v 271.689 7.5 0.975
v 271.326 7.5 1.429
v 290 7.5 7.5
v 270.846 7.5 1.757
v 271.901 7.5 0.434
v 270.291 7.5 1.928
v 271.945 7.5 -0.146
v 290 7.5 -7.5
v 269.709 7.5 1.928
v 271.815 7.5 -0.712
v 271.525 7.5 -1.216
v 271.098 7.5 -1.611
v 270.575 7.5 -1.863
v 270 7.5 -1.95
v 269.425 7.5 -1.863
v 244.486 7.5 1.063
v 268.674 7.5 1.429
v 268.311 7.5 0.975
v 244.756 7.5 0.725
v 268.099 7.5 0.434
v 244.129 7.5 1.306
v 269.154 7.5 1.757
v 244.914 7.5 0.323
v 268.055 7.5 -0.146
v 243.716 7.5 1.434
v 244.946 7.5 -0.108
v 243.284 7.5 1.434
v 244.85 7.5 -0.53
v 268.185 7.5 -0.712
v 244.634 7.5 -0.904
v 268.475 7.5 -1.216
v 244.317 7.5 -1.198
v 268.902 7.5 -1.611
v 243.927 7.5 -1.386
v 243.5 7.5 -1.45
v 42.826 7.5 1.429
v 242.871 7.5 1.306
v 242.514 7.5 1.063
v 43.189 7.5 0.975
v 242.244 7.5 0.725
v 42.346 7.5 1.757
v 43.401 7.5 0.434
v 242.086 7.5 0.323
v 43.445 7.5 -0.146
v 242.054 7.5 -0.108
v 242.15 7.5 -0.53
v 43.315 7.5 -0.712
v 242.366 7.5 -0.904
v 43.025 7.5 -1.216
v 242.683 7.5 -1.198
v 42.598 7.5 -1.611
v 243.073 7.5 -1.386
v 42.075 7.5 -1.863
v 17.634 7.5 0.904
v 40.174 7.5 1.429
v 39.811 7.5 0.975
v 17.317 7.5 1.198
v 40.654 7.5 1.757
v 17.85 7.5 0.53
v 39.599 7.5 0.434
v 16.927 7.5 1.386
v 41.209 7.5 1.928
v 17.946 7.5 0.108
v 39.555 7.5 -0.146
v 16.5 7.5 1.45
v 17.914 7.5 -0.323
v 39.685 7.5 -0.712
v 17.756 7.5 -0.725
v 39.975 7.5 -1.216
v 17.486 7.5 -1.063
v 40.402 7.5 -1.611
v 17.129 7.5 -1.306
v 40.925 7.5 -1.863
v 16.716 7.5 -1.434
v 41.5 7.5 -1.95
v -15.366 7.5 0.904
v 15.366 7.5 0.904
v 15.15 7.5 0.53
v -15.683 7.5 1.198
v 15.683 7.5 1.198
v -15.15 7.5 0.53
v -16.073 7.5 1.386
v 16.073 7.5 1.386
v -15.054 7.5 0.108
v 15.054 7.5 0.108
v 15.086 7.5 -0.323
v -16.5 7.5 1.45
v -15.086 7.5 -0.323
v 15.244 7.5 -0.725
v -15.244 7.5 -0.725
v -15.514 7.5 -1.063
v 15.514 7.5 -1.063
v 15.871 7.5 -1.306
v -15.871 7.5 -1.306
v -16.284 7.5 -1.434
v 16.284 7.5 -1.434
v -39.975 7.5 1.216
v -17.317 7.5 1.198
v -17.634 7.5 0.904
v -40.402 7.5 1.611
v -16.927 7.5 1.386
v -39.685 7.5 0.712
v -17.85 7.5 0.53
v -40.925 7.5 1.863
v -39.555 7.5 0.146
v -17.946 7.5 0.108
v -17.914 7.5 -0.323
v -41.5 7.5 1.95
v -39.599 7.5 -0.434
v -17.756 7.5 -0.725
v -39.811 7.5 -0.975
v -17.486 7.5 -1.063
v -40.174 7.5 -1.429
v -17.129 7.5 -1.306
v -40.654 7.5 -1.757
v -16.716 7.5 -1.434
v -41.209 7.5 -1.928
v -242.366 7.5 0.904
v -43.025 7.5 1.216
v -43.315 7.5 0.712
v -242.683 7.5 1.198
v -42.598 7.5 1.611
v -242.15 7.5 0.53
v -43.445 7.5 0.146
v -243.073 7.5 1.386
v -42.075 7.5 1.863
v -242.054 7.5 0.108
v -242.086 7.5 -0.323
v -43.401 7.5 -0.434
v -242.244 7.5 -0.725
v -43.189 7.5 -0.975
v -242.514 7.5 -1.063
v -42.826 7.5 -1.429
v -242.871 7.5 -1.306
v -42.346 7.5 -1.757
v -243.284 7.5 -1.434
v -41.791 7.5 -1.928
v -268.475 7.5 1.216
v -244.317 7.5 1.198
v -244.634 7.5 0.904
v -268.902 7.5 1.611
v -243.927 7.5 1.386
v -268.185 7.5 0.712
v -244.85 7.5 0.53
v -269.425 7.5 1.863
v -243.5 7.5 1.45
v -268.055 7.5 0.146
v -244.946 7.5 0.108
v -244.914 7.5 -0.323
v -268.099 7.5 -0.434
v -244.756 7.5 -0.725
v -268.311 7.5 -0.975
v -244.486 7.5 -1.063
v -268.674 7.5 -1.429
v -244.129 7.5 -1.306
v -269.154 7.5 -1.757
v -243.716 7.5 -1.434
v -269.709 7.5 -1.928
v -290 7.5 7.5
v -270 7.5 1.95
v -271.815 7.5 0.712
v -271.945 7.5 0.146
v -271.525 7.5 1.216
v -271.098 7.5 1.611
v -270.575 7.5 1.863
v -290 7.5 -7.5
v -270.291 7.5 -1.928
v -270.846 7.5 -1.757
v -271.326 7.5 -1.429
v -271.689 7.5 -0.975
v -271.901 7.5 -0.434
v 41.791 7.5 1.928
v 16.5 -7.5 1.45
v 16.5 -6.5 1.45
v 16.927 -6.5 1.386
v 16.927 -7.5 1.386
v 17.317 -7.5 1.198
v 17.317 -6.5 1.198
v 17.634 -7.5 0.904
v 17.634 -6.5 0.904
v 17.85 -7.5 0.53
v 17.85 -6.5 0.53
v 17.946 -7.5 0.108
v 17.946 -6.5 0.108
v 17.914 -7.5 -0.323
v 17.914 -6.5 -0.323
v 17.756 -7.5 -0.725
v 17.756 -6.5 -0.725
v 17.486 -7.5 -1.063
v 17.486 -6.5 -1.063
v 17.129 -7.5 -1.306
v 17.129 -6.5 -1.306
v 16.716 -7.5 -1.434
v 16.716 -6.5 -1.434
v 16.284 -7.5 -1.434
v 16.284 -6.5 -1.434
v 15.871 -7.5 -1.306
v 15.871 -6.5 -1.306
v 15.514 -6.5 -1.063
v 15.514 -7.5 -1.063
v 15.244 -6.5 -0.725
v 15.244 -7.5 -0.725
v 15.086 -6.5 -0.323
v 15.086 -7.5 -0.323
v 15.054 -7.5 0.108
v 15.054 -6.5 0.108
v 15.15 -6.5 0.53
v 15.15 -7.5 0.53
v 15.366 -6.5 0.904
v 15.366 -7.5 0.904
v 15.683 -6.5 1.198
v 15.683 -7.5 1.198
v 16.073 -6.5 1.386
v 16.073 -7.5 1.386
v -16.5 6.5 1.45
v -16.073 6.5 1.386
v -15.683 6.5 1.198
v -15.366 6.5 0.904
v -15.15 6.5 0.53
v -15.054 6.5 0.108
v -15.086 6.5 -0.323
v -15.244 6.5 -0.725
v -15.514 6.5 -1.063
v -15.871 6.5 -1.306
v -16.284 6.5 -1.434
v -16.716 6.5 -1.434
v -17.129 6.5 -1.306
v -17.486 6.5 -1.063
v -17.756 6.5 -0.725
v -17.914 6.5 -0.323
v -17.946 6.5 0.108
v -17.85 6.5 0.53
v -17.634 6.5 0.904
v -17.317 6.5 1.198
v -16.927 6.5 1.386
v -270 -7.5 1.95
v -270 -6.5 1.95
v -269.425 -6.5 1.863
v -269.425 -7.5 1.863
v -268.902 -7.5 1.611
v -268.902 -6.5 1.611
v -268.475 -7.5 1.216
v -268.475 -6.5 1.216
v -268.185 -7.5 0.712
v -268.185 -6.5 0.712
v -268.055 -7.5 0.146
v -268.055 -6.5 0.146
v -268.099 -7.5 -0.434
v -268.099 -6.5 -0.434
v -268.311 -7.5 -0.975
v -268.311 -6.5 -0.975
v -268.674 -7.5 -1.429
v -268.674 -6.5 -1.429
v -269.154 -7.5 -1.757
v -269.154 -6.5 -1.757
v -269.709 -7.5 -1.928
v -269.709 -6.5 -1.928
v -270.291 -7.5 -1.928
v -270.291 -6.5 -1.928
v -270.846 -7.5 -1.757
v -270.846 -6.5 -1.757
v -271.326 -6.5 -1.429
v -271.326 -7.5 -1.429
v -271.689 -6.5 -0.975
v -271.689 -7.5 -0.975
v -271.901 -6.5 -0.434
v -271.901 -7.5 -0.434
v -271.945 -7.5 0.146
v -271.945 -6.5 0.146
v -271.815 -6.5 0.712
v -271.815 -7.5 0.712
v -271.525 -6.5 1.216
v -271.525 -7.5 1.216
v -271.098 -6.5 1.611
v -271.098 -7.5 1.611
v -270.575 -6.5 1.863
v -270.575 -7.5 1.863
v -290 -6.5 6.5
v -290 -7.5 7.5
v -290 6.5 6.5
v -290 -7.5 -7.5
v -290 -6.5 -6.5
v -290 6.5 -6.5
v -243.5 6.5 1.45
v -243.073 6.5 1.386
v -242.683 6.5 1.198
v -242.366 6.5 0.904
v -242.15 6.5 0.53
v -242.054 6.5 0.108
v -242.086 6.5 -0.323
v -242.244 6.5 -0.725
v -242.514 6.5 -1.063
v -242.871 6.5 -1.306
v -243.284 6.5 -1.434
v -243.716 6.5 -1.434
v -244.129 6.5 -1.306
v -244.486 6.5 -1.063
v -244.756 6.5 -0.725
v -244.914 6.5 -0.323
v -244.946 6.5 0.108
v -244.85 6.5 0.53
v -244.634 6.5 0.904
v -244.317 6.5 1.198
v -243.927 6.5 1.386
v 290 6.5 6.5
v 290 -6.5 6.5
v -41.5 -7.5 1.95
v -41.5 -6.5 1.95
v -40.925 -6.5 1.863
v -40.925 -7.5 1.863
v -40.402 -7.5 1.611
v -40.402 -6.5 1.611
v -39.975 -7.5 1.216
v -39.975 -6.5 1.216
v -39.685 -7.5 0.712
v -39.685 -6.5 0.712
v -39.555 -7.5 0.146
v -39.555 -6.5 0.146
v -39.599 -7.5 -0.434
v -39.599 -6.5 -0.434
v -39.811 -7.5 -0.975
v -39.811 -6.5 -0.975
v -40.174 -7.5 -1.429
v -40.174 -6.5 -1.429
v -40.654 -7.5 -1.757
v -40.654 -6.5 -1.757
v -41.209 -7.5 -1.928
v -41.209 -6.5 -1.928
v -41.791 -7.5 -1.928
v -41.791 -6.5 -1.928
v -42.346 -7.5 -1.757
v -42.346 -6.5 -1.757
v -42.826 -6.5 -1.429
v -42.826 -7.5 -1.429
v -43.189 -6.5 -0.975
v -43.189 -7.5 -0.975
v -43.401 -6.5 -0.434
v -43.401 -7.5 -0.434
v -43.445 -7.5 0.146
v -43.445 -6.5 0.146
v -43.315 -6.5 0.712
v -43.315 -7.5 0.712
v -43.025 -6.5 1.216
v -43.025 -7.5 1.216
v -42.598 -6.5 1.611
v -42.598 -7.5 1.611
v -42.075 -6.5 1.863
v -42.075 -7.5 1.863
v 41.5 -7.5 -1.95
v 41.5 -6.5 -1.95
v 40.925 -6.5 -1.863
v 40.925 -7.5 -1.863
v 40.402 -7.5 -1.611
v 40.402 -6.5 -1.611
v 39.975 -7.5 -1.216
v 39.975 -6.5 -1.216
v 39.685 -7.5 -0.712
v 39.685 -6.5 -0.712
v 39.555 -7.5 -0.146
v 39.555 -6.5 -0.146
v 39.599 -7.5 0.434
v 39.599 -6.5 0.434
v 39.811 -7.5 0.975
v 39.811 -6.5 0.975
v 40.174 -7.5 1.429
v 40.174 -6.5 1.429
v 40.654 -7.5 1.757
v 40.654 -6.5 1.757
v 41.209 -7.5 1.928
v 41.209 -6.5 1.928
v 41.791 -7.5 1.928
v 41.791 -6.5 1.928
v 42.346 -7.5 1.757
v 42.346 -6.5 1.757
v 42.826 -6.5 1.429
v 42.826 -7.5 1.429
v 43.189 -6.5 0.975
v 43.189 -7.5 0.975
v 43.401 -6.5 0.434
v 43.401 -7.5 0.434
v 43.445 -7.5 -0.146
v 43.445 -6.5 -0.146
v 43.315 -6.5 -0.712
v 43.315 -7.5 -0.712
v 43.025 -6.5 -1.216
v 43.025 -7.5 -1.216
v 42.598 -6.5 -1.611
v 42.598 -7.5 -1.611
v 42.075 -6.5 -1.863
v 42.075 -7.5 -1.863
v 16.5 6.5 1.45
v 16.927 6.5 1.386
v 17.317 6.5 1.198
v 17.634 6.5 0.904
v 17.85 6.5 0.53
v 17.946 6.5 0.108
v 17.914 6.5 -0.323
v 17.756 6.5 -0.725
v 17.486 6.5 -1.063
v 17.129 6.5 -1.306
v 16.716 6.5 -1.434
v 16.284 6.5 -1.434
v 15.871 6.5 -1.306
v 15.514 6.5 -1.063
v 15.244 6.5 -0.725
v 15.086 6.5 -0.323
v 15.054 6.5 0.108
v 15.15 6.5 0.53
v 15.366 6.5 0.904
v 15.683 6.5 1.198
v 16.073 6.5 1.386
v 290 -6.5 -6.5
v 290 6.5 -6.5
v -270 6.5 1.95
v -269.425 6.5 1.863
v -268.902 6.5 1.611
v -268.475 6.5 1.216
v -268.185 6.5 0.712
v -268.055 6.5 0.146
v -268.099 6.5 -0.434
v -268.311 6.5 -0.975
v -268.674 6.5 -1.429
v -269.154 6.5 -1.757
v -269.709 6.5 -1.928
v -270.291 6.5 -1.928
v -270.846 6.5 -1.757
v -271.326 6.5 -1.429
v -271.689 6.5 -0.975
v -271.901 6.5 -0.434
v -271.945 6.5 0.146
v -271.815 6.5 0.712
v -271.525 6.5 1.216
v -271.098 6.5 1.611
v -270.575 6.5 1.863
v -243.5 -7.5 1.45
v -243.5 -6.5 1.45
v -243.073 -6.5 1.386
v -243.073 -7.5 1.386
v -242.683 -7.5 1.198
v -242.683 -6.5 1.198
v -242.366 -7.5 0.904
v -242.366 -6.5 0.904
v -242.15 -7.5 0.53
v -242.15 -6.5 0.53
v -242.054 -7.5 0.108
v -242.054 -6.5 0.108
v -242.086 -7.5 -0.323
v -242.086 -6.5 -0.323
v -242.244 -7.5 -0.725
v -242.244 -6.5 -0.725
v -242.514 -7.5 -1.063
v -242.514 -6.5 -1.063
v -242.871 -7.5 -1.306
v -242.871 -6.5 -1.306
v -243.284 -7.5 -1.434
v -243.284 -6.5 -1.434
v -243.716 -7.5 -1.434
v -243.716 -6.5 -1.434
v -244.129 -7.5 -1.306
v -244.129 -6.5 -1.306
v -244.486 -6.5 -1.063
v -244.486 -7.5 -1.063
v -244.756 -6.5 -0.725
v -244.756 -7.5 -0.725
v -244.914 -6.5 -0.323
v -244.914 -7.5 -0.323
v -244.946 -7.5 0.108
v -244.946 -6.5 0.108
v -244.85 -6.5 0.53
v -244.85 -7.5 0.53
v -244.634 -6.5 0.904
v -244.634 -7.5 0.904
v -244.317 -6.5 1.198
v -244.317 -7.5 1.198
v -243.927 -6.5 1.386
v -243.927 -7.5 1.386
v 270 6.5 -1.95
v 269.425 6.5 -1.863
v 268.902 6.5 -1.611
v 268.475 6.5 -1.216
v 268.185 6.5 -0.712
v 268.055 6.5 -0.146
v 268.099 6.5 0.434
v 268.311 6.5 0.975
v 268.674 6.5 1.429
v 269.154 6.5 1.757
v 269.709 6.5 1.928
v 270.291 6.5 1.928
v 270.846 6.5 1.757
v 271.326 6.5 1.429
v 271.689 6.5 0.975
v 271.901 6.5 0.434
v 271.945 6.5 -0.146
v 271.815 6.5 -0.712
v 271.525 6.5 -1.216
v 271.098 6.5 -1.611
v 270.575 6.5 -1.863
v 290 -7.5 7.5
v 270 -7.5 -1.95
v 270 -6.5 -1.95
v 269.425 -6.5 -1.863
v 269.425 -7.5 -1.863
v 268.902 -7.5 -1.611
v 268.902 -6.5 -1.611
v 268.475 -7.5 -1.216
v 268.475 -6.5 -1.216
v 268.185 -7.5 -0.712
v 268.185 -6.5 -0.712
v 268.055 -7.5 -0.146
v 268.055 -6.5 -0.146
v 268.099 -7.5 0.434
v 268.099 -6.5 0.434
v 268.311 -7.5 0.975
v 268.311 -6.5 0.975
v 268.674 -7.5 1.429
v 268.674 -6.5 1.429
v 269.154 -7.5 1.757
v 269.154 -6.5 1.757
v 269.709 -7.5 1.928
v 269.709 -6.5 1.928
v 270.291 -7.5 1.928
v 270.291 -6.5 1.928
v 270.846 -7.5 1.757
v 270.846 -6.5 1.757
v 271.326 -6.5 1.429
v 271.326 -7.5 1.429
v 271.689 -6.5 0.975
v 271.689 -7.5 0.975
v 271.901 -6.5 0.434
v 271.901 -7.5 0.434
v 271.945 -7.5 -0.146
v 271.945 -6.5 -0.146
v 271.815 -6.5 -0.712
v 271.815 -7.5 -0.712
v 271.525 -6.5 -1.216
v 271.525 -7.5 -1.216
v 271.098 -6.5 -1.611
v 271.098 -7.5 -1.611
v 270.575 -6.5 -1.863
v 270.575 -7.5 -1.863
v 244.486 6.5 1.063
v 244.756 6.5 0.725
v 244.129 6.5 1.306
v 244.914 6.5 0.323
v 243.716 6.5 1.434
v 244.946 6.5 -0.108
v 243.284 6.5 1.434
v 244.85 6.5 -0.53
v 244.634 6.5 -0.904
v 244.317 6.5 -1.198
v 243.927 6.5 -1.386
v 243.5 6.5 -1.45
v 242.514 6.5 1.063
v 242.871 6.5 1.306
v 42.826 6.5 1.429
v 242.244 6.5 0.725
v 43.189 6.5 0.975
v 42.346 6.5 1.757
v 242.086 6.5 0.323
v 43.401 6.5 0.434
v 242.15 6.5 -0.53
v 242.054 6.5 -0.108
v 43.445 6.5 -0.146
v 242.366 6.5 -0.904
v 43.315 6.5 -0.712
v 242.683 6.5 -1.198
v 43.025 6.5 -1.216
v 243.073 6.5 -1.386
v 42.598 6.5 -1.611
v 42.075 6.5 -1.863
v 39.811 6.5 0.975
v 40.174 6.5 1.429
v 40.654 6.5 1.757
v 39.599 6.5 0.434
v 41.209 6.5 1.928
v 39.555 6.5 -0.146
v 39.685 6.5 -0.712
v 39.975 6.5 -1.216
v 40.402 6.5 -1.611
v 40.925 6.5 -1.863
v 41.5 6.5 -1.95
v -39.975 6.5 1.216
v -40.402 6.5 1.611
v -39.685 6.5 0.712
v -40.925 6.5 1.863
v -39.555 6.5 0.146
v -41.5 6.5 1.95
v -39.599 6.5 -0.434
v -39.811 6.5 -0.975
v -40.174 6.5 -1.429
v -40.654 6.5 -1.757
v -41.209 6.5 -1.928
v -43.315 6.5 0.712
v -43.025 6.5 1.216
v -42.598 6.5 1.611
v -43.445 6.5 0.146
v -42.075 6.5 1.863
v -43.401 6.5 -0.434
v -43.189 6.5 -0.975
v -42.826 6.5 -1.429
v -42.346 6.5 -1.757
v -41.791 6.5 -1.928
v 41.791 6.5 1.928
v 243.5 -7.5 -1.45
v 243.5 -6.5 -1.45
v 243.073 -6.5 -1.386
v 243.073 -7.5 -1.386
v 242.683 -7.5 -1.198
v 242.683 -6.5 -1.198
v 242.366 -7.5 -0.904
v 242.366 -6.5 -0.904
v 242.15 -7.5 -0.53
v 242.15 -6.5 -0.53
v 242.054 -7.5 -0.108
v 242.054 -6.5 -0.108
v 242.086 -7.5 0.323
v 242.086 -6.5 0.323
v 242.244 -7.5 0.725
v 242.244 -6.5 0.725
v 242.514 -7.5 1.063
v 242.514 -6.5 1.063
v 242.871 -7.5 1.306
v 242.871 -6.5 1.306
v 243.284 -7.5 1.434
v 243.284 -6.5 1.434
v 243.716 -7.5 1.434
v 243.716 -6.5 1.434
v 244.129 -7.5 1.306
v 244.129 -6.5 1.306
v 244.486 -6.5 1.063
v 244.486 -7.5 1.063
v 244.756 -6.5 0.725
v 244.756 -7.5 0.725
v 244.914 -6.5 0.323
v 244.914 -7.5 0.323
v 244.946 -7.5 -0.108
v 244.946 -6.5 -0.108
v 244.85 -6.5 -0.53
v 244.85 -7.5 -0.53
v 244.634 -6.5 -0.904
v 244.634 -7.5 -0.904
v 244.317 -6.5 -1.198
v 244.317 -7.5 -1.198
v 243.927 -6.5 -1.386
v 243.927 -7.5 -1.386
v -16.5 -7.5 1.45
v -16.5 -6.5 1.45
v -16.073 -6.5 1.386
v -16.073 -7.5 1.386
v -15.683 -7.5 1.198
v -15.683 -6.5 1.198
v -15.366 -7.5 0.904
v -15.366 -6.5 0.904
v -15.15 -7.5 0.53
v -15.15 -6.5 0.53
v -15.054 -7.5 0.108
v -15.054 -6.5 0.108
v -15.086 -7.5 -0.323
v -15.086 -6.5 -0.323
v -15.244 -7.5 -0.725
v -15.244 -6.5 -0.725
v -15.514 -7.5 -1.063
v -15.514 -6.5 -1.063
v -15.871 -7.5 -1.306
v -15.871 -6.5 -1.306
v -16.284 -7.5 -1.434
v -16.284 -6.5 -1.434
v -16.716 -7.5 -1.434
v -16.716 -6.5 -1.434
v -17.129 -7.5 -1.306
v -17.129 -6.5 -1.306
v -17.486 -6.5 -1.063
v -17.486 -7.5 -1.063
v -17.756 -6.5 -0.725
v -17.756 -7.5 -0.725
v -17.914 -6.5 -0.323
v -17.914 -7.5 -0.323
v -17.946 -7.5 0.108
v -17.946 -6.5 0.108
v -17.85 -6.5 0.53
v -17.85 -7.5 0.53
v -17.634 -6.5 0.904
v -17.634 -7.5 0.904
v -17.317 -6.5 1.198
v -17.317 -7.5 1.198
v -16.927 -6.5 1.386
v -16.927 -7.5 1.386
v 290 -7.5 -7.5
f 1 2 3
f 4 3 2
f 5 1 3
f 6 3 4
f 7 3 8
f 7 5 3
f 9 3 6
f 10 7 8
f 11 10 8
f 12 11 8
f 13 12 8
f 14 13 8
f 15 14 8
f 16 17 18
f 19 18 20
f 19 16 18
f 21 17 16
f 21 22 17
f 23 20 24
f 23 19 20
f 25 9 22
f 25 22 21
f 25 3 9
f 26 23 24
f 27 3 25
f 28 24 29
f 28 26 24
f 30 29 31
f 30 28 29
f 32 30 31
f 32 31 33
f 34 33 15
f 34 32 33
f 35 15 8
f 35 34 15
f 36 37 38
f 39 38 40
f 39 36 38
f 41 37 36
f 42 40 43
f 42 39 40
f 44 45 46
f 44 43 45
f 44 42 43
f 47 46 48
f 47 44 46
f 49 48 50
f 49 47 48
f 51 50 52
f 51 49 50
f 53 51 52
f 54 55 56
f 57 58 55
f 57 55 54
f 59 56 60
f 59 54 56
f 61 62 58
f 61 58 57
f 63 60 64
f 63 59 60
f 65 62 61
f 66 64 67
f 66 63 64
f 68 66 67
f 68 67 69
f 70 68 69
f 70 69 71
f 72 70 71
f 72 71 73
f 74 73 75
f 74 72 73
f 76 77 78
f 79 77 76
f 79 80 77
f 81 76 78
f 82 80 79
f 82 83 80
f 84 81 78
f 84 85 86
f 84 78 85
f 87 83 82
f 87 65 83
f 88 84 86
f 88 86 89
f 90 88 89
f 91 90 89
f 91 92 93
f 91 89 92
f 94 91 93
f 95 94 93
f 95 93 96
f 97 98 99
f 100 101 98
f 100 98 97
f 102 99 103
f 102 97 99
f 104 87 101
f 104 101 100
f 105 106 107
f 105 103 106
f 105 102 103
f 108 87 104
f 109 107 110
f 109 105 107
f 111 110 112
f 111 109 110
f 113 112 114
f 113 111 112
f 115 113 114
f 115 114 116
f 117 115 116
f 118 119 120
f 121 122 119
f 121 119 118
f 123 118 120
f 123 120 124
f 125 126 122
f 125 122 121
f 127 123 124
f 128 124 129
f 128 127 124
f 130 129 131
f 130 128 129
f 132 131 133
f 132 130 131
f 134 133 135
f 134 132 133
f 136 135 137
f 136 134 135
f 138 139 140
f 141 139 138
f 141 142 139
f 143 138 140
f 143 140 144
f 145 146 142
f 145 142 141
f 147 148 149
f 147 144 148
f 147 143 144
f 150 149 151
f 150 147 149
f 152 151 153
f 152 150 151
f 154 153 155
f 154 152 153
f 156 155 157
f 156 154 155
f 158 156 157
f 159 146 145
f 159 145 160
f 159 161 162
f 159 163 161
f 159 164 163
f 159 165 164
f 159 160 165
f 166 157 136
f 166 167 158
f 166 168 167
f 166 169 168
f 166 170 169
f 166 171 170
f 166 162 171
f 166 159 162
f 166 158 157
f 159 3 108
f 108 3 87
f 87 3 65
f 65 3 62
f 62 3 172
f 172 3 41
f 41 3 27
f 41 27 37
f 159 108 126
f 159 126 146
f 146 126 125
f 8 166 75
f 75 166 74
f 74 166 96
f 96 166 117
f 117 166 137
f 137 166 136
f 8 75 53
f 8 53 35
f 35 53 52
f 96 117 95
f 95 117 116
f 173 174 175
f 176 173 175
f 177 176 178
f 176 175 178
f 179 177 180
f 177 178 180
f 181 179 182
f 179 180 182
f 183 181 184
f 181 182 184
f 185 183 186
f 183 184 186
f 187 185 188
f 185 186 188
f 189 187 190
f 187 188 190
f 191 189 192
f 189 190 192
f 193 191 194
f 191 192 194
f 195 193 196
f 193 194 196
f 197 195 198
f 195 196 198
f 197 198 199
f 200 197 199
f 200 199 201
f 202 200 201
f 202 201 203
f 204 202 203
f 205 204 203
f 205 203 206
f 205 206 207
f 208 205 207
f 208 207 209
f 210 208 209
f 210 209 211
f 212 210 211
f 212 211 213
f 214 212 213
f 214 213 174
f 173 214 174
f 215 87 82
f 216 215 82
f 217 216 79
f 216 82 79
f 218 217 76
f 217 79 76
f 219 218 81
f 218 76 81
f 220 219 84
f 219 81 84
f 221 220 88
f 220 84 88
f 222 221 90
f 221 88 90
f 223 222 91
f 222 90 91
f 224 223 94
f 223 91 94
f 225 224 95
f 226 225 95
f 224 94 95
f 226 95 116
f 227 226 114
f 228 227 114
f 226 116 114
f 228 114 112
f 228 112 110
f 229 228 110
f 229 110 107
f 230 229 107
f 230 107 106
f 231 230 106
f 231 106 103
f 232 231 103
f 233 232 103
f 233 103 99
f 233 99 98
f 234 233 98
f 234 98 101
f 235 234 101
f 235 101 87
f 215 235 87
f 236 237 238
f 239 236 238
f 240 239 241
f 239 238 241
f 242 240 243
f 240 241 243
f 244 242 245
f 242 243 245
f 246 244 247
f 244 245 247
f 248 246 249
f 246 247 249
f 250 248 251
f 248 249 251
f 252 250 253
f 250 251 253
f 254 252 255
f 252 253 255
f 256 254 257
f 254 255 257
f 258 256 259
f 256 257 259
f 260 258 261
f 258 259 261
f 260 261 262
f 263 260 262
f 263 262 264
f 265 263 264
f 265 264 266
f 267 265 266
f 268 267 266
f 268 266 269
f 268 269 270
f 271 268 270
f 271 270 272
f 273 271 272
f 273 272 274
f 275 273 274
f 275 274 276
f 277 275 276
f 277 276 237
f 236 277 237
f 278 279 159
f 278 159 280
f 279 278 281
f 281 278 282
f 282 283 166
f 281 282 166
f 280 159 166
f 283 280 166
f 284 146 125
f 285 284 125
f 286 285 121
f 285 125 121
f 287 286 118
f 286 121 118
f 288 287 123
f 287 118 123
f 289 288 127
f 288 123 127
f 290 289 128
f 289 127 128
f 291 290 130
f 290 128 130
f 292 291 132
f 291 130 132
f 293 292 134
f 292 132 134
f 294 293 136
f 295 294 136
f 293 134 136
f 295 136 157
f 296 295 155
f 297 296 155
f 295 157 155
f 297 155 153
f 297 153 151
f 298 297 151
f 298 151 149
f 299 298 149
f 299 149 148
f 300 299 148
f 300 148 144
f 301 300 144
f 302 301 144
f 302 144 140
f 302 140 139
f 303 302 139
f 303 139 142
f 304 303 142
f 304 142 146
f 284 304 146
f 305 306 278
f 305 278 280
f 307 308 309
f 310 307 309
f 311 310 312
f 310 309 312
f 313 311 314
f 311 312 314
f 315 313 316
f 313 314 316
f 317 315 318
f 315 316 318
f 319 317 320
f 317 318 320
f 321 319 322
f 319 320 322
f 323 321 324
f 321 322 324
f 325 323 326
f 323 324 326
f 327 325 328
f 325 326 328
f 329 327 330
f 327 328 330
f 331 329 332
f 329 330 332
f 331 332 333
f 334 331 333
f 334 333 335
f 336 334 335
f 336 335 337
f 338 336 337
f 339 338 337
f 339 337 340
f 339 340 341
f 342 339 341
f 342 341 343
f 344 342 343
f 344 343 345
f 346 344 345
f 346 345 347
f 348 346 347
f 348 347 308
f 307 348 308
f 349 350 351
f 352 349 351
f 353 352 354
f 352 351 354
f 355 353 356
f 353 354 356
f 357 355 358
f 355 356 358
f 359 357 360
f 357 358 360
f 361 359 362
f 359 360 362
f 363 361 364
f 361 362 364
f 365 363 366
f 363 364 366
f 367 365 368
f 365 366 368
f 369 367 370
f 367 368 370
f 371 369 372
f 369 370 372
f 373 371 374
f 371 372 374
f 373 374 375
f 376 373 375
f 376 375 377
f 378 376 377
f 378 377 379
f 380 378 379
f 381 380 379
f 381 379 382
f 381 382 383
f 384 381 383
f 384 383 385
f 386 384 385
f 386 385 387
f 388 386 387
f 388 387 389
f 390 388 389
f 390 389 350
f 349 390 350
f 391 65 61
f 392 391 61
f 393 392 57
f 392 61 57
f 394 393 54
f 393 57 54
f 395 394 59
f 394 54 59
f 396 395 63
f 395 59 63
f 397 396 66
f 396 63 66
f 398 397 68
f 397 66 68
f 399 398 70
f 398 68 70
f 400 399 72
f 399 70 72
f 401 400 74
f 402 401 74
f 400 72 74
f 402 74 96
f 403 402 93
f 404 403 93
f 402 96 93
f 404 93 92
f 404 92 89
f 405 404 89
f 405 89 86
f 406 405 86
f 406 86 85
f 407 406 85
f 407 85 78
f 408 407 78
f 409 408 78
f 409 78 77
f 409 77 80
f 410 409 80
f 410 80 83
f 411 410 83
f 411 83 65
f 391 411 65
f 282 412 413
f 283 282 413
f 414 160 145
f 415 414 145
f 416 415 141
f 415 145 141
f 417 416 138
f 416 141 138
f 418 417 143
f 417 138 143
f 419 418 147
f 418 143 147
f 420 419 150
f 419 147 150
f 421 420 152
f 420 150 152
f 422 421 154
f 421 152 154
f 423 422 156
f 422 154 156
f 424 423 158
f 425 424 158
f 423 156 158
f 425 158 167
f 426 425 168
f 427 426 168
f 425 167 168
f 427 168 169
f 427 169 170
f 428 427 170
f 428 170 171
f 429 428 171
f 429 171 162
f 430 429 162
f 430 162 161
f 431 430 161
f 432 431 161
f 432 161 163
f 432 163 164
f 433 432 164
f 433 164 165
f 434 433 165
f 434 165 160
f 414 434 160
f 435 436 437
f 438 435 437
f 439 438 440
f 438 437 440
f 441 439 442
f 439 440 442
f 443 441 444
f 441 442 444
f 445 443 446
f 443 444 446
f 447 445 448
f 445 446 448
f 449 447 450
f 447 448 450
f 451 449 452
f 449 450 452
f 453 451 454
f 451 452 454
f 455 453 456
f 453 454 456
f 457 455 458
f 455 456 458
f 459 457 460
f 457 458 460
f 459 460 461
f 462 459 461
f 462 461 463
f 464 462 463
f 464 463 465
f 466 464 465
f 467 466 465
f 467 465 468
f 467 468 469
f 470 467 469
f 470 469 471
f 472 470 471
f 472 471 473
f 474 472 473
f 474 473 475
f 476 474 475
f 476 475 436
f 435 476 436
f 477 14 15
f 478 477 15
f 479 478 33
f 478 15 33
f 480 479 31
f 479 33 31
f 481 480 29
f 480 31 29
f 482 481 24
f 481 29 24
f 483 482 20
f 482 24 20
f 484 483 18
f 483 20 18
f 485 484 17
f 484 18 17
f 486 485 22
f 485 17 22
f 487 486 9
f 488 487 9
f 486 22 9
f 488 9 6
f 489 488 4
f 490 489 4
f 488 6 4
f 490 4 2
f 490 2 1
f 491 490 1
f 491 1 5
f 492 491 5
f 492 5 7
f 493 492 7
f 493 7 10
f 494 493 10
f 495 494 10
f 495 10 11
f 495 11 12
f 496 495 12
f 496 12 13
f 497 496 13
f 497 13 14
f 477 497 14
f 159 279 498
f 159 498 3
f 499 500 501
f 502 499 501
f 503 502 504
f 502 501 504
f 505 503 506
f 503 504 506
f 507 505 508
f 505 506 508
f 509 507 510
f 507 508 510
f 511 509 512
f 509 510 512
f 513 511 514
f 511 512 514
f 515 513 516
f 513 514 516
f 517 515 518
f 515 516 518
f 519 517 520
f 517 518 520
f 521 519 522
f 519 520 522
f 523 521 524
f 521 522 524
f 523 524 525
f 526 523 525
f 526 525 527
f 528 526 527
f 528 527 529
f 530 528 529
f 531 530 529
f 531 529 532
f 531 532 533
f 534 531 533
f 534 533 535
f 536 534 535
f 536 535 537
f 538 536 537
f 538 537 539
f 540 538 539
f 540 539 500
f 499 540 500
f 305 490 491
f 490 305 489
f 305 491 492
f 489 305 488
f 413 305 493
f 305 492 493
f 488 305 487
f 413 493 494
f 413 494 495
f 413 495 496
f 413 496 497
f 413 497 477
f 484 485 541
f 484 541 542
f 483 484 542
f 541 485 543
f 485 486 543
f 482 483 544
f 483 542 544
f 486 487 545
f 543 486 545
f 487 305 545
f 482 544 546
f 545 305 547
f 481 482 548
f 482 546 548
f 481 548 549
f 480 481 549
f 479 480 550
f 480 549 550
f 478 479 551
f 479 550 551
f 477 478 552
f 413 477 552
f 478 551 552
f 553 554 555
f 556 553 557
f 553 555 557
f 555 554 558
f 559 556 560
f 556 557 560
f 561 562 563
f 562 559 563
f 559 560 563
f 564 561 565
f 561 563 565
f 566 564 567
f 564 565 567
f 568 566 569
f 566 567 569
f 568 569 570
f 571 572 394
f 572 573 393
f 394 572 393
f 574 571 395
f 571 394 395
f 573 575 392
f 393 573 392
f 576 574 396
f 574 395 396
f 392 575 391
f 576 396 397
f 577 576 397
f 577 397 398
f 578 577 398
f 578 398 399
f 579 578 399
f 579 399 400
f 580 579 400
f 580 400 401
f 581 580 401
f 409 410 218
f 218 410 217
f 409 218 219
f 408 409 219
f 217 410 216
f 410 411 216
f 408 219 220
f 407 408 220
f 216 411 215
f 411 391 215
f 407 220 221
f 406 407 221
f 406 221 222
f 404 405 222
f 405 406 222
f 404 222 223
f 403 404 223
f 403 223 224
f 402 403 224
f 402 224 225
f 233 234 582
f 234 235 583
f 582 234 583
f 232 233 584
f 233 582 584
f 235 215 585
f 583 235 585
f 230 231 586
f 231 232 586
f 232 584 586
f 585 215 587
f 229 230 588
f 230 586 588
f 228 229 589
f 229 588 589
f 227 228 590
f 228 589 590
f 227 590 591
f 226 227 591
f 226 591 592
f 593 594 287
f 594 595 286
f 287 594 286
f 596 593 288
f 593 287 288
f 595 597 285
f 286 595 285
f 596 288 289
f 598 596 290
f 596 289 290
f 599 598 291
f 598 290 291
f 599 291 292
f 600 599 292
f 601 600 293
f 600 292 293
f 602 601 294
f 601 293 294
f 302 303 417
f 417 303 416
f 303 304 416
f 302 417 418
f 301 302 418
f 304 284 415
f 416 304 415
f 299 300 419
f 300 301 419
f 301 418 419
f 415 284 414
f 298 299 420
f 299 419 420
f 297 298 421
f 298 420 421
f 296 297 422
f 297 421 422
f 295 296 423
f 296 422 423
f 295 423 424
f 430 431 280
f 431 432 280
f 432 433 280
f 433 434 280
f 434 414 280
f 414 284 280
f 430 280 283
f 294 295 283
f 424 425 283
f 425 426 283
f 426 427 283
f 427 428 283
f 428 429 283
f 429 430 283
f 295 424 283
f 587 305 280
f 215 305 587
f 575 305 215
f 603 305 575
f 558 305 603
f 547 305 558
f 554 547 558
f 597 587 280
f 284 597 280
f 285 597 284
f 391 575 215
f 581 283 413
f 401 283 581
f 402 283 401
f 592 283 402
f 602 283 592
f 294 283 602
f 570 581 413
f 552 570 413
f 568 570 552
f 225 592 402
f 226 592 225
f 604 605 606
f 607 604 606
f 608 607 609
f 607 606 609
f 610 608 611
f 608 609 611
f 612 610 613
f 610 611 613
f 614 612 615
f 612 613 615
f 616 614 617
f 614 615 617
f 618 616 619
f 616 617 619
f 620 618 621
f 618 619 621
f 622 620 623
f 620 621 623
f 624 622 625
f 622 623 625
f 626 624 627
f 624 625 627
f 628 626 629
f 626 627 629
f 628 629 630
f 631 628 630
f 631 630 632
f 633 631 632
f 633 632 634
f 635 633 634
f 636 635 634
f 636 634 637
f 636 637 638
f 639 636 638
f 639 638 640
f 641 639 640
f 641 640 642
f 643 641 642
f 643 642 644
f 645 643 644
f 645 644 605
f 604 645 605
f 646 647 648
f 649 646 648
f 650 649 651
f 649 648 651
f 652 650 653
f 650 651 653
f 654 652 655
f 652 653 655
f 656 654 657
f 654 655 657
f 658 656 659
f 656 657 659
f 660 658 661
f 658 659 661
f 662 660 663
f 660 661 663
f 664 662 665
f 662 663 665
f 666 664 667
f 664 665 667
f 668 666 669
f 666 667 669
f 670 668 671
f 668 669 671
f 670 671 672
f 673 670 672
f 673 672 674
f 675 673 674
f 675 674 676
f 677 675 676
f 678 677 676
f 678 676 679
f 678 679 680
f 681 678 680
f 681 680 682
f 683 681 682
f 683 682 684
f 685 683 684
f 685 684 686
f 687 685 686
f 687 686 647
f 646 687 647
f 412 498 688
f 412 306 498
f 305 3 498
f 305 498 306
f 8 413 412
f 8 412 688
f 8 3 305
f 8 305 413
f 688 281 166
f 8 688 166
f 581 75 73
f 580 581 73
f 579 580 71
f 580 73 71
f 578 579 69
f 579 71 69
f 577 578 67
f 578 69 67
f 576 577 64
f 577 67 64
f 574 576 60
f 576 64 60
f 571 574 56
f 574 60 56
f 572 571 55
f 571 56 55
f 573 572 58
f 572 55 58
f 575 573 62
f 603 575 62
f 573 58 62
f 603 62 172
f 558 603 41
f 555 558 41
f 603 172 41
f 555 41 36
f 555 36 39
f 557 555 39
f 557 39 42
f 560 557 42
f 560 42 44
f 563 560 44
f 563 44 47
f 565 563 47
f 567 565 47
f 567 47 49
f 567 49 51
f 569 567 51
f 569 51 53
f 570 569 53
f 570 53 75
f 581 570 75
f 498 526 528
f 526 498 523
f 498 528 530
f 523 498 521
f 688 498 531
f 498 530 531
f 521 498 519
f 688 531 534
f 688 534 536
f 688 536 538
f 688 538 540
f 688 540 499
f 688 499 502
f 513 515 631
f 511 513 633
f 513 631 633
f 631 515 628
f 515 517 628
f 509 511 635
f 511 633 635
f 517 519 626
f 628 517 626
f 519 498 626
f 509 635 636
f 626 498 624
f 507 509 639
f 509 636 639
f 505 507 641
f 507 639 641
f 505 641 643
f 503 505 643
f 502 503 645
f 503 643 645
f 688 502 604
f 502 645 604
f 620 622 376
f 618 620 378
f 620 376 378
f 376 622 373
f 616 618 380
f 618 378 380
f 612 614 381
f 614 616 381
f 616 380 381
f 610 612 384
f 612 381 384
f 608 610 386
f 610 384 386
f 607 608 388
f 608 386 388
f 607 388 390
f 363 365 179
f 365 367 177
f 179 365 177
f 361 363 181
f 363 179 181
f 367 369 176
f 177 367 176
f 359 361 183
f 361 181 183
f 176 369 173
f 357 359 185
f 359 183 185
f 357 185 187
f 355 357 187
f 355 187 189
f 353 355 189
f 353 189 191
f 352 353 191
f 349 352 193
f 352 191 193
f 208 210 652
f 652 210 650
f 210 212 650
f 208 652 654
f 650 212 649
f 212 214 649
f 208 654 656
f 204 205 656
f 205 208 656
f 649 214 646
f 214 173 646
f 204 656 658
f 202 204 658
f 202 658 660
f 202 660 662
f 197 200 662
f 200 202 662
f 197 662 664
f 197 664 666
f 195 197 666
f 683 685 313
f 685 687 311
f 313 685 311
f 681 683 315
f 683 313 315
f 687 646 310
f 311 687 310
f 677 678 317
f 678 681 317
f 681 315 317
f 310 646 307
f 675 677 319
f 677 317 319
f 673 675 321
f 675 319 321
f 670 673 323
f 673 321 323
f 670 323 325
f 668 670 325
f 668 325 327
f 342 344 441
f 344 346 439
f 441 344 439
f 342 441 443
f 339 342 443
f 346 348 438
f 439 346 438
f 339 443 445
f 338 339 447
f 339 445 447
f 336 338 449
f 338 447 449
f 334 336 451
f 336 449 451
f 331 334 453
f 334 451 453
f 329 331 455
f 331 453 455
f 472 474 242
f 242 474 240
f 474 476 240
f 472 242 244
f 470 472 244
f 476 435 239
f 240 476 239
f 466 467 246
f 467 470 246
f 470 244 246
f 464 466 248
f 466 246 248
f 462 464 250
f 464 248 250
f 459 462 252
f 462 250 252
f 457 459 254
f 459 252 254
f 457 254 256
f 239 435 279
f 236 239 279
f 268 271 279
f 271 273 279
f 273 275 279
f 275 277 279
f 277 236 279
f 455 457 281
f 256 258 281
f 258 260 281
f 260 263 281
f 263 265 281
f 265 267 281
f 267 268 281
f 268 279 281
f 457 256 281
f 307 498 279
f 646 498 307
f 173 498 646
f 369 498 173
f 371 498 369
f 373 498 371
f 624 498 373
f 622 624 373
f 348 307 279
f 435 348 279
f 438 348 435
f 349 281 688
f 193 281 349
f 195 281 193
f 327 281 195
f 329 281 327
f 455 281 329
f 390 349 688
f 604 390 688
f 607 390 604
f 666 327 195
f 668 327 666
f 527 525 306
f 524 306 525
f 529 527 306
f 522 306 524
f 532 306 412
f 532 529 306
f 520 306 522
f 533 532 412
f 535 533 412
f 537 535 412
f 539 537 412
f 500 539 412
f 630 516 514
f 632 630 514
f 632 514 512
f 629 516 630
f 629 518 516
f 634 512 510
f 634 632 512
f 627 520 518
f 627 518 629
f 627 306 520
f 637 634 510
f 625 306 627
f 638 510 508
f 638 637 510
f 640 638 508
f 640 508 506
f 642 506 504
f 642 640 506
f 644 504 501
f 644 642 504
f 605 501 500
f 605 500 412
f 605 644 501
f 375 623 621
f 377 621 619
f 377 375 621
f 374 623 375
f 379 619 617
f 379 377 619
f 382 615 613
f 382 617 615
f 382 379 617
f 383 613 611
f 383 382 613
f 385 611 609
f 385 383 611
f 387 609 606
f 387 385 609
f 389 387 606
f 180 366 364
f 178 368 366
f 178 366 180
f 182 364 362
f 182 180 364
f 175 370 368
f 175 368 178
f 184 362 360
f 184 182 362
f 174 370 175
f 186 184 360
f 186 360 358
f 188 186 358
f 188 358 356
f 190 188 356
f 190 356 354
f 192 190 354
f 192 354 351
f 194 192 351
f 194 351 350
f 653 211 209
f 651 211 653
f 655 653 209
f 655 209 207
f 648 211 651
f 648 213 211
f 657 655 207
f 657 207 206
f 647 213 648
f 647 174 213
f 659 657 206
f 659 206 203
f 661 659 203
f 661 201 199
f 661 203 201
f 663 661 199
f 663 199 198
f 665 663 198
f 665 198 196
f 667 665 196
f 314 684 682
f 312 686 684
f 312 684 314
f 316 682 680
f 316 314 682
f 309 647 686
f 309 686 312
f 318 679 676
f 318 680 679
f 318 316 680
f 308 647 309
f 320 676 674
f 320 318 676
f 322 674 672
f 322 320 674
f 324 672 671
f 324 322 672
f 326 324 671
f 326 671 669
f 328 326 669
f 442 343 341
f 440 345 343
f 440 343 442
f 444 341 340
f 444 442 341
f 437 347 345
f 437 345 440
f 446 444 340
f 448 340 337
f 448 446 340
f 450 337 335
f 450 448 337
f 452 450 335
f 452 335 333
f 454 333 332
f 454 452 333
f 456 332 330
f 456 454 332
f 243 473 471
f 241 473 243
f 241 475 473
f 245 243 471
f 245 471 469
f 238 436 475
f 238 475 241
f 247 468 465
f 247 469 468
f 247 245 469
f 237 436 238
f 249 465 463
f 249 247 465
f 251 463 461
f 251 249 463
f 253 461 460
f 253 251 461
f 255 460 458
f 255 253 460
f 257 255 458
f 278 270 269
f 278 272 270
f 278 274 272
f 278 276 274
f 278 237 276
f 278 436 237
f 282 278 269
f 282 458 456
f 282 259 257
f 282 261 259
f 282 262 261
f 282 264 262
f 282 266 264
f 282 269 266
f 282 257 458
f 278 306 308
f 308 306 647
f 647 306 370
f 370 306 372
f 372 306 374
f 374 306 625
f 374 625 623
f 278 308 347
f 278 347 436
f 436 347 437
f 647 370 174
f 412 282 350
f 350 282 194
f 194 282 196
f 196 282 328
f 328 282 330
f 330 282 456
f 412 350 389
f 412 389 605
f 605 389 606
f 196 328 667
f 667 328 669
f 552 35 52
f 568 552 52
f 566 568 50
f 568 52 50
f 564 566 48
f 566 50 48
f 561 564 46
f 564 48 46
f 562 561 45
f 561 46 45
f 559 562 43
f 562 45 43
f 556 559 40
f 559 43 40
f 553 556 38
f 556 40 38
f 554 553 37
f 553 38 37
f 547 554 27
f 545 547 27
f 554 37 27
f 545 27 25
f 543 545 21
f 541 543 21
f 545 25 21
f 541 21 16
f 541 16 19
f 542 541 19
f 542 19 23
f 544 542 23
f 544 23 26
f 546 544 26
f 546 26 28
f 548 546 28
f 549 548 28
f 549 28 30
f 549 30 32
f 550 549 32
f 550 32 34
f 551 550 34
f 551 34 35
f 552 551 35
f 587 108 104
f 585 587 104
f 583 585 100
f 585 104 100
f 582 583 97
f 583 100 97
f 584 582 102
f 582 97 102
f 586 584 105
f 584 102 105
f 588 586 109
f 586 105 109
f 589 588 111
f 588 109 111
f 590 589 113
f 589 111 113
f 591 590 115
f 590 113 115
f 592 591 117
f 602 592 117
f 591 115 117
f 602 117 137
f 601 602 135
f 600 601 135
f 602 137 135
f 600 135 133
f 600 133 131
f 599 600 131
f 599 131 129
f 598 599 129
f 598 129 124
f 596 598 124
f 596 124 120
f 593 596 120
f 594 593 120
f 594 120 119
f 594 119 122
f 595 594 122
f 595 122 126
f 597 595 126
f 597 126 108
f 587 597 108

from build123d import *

# Parameters (mm, degrees)
SKETCH_11_W         = 15
SKETCH_11_H         = 15
SKETCH_11_W_2       = 13
SKETCH_11_H_2       = 13
F_15X15X1_1_DEPTH   = 640
SKETCH_12_R         = 1.95
CUT_EXTRUDE_1_DEPTH = 321.43915179
SKETCH_13_R         = 1.45
CUT_EXTRUDE_2_DEPTH = 321.43915179
SKETCH_14_R         = 1.45
CUT_EXTRUDE_3_DEPTH = 321.43915179
SKETCH_15_W         = 44.103354617
SKETCH_15_H         = 76.02578272
SKETCH_15_W_2       = 30.662332257
SKETCH_15_H_2       = 81.486198053
CUT_EXTRUDE_4_DEPTH = 321.43915179


with BuildPart() as part:
    # 草图11 → 铝管 15X15X1(1) (new body)
    with BuildSketch(Plane(origin=(-320, 0, 0), x_dir=(0, 0, -1), z_dir=(1, 0, 0))):
        Rectangle(SKETCH_11_W, SKETCH_11_H)
        Rectangle(SKETCH_11_W_2, SKETCH_11_H_2, mode=Mode.SUBTRACT)
    extrude(amount=F_15X15X1_1_DEPTH)

    # 草图12 → 切除-拉伸1 (cut, through all)
    with BuildSketch(Plane(origin=(0, 7.5, 0), x_dir=(1, 0, 0), z_dir=(0, 1, 0))):
        with Locations(Location((-41.5, 0, 0), (0, 0, 270))):
            Circle(SKETCH_12_R)
        with Locations(Location((-270, 0, 0), (0, 0, 270))):
            Circle(SKETCH_12_R)
        with Locations(Location((270, 0, 0), (0, 0, 90))):
            Circle(SKETCH_12_R)
        with Locations(Location((41.5, 0, 0), (0, 0, 90))):
            Circle(SKETCH_12_R)
    extrude(amount=-CUT_EXTRUDE_1_DEPTH, mode=Mode.SUBTRACT)

    # 草图13 → 切除-拉伸2 (cut, through all)
    with BuildSketch(Plane(origin=(0, 7.5, 0), x_dir=(1, 0, 0), z_dir=(0, 1, 0))):
        with Locations(Location((-243.5, 0, 0), (0, 0, 270))):
            Circle(SKETCH_13_R)
        with Locations(Location((243.5, 0, 0), (0, 0, 90))):
            Circle(SKETCH_13_R)
    extrude(amount=-CUT_EXTRUDE_2_DEPTH, mode=Mode.SUBTRACT)

    # 草图14 → 切除-拉伸3 (cut, through all)
    with BuildSketch(Plane(origin=(0, 7.5, 0), x_dir=(1, 0, 0), z_dir=(0, 1, 0))):
        with Locations(Location((-16.5, 0, 0), (0, 0, 270))):
            Circle(SKETCH_14_R)
        with Locations(Location((16.5, 0, 0), (0, 0, 270))):
            Circle(SKETCH_14_R)
    extrude(amount=-CUT_EXTRUDE_3_DEPTH, mode=Mode.SUBTRACT)

    # 草图15 → 切除-拉伸4 (cut, through all)
    with BuildSketch(Plane(origin=(0, 7.5, 0), x_dir=(1, 0, 0), z_dir=(0, 1, 0))):
        with Locations((-312.051677309, 7.560575077)):
            Rectangle(SKETCH_15_W, SKETCH_15_H)
        with Locations((305.331166129, -3.150239616)):
            Rectangle(SKETCH_15_W_2, SKETCH_15_H_2)
    extrude(amount=-CUT_EXTRUDE_4_DEPTH, mode=Mode.SUBTRACT)


solid = part.part
